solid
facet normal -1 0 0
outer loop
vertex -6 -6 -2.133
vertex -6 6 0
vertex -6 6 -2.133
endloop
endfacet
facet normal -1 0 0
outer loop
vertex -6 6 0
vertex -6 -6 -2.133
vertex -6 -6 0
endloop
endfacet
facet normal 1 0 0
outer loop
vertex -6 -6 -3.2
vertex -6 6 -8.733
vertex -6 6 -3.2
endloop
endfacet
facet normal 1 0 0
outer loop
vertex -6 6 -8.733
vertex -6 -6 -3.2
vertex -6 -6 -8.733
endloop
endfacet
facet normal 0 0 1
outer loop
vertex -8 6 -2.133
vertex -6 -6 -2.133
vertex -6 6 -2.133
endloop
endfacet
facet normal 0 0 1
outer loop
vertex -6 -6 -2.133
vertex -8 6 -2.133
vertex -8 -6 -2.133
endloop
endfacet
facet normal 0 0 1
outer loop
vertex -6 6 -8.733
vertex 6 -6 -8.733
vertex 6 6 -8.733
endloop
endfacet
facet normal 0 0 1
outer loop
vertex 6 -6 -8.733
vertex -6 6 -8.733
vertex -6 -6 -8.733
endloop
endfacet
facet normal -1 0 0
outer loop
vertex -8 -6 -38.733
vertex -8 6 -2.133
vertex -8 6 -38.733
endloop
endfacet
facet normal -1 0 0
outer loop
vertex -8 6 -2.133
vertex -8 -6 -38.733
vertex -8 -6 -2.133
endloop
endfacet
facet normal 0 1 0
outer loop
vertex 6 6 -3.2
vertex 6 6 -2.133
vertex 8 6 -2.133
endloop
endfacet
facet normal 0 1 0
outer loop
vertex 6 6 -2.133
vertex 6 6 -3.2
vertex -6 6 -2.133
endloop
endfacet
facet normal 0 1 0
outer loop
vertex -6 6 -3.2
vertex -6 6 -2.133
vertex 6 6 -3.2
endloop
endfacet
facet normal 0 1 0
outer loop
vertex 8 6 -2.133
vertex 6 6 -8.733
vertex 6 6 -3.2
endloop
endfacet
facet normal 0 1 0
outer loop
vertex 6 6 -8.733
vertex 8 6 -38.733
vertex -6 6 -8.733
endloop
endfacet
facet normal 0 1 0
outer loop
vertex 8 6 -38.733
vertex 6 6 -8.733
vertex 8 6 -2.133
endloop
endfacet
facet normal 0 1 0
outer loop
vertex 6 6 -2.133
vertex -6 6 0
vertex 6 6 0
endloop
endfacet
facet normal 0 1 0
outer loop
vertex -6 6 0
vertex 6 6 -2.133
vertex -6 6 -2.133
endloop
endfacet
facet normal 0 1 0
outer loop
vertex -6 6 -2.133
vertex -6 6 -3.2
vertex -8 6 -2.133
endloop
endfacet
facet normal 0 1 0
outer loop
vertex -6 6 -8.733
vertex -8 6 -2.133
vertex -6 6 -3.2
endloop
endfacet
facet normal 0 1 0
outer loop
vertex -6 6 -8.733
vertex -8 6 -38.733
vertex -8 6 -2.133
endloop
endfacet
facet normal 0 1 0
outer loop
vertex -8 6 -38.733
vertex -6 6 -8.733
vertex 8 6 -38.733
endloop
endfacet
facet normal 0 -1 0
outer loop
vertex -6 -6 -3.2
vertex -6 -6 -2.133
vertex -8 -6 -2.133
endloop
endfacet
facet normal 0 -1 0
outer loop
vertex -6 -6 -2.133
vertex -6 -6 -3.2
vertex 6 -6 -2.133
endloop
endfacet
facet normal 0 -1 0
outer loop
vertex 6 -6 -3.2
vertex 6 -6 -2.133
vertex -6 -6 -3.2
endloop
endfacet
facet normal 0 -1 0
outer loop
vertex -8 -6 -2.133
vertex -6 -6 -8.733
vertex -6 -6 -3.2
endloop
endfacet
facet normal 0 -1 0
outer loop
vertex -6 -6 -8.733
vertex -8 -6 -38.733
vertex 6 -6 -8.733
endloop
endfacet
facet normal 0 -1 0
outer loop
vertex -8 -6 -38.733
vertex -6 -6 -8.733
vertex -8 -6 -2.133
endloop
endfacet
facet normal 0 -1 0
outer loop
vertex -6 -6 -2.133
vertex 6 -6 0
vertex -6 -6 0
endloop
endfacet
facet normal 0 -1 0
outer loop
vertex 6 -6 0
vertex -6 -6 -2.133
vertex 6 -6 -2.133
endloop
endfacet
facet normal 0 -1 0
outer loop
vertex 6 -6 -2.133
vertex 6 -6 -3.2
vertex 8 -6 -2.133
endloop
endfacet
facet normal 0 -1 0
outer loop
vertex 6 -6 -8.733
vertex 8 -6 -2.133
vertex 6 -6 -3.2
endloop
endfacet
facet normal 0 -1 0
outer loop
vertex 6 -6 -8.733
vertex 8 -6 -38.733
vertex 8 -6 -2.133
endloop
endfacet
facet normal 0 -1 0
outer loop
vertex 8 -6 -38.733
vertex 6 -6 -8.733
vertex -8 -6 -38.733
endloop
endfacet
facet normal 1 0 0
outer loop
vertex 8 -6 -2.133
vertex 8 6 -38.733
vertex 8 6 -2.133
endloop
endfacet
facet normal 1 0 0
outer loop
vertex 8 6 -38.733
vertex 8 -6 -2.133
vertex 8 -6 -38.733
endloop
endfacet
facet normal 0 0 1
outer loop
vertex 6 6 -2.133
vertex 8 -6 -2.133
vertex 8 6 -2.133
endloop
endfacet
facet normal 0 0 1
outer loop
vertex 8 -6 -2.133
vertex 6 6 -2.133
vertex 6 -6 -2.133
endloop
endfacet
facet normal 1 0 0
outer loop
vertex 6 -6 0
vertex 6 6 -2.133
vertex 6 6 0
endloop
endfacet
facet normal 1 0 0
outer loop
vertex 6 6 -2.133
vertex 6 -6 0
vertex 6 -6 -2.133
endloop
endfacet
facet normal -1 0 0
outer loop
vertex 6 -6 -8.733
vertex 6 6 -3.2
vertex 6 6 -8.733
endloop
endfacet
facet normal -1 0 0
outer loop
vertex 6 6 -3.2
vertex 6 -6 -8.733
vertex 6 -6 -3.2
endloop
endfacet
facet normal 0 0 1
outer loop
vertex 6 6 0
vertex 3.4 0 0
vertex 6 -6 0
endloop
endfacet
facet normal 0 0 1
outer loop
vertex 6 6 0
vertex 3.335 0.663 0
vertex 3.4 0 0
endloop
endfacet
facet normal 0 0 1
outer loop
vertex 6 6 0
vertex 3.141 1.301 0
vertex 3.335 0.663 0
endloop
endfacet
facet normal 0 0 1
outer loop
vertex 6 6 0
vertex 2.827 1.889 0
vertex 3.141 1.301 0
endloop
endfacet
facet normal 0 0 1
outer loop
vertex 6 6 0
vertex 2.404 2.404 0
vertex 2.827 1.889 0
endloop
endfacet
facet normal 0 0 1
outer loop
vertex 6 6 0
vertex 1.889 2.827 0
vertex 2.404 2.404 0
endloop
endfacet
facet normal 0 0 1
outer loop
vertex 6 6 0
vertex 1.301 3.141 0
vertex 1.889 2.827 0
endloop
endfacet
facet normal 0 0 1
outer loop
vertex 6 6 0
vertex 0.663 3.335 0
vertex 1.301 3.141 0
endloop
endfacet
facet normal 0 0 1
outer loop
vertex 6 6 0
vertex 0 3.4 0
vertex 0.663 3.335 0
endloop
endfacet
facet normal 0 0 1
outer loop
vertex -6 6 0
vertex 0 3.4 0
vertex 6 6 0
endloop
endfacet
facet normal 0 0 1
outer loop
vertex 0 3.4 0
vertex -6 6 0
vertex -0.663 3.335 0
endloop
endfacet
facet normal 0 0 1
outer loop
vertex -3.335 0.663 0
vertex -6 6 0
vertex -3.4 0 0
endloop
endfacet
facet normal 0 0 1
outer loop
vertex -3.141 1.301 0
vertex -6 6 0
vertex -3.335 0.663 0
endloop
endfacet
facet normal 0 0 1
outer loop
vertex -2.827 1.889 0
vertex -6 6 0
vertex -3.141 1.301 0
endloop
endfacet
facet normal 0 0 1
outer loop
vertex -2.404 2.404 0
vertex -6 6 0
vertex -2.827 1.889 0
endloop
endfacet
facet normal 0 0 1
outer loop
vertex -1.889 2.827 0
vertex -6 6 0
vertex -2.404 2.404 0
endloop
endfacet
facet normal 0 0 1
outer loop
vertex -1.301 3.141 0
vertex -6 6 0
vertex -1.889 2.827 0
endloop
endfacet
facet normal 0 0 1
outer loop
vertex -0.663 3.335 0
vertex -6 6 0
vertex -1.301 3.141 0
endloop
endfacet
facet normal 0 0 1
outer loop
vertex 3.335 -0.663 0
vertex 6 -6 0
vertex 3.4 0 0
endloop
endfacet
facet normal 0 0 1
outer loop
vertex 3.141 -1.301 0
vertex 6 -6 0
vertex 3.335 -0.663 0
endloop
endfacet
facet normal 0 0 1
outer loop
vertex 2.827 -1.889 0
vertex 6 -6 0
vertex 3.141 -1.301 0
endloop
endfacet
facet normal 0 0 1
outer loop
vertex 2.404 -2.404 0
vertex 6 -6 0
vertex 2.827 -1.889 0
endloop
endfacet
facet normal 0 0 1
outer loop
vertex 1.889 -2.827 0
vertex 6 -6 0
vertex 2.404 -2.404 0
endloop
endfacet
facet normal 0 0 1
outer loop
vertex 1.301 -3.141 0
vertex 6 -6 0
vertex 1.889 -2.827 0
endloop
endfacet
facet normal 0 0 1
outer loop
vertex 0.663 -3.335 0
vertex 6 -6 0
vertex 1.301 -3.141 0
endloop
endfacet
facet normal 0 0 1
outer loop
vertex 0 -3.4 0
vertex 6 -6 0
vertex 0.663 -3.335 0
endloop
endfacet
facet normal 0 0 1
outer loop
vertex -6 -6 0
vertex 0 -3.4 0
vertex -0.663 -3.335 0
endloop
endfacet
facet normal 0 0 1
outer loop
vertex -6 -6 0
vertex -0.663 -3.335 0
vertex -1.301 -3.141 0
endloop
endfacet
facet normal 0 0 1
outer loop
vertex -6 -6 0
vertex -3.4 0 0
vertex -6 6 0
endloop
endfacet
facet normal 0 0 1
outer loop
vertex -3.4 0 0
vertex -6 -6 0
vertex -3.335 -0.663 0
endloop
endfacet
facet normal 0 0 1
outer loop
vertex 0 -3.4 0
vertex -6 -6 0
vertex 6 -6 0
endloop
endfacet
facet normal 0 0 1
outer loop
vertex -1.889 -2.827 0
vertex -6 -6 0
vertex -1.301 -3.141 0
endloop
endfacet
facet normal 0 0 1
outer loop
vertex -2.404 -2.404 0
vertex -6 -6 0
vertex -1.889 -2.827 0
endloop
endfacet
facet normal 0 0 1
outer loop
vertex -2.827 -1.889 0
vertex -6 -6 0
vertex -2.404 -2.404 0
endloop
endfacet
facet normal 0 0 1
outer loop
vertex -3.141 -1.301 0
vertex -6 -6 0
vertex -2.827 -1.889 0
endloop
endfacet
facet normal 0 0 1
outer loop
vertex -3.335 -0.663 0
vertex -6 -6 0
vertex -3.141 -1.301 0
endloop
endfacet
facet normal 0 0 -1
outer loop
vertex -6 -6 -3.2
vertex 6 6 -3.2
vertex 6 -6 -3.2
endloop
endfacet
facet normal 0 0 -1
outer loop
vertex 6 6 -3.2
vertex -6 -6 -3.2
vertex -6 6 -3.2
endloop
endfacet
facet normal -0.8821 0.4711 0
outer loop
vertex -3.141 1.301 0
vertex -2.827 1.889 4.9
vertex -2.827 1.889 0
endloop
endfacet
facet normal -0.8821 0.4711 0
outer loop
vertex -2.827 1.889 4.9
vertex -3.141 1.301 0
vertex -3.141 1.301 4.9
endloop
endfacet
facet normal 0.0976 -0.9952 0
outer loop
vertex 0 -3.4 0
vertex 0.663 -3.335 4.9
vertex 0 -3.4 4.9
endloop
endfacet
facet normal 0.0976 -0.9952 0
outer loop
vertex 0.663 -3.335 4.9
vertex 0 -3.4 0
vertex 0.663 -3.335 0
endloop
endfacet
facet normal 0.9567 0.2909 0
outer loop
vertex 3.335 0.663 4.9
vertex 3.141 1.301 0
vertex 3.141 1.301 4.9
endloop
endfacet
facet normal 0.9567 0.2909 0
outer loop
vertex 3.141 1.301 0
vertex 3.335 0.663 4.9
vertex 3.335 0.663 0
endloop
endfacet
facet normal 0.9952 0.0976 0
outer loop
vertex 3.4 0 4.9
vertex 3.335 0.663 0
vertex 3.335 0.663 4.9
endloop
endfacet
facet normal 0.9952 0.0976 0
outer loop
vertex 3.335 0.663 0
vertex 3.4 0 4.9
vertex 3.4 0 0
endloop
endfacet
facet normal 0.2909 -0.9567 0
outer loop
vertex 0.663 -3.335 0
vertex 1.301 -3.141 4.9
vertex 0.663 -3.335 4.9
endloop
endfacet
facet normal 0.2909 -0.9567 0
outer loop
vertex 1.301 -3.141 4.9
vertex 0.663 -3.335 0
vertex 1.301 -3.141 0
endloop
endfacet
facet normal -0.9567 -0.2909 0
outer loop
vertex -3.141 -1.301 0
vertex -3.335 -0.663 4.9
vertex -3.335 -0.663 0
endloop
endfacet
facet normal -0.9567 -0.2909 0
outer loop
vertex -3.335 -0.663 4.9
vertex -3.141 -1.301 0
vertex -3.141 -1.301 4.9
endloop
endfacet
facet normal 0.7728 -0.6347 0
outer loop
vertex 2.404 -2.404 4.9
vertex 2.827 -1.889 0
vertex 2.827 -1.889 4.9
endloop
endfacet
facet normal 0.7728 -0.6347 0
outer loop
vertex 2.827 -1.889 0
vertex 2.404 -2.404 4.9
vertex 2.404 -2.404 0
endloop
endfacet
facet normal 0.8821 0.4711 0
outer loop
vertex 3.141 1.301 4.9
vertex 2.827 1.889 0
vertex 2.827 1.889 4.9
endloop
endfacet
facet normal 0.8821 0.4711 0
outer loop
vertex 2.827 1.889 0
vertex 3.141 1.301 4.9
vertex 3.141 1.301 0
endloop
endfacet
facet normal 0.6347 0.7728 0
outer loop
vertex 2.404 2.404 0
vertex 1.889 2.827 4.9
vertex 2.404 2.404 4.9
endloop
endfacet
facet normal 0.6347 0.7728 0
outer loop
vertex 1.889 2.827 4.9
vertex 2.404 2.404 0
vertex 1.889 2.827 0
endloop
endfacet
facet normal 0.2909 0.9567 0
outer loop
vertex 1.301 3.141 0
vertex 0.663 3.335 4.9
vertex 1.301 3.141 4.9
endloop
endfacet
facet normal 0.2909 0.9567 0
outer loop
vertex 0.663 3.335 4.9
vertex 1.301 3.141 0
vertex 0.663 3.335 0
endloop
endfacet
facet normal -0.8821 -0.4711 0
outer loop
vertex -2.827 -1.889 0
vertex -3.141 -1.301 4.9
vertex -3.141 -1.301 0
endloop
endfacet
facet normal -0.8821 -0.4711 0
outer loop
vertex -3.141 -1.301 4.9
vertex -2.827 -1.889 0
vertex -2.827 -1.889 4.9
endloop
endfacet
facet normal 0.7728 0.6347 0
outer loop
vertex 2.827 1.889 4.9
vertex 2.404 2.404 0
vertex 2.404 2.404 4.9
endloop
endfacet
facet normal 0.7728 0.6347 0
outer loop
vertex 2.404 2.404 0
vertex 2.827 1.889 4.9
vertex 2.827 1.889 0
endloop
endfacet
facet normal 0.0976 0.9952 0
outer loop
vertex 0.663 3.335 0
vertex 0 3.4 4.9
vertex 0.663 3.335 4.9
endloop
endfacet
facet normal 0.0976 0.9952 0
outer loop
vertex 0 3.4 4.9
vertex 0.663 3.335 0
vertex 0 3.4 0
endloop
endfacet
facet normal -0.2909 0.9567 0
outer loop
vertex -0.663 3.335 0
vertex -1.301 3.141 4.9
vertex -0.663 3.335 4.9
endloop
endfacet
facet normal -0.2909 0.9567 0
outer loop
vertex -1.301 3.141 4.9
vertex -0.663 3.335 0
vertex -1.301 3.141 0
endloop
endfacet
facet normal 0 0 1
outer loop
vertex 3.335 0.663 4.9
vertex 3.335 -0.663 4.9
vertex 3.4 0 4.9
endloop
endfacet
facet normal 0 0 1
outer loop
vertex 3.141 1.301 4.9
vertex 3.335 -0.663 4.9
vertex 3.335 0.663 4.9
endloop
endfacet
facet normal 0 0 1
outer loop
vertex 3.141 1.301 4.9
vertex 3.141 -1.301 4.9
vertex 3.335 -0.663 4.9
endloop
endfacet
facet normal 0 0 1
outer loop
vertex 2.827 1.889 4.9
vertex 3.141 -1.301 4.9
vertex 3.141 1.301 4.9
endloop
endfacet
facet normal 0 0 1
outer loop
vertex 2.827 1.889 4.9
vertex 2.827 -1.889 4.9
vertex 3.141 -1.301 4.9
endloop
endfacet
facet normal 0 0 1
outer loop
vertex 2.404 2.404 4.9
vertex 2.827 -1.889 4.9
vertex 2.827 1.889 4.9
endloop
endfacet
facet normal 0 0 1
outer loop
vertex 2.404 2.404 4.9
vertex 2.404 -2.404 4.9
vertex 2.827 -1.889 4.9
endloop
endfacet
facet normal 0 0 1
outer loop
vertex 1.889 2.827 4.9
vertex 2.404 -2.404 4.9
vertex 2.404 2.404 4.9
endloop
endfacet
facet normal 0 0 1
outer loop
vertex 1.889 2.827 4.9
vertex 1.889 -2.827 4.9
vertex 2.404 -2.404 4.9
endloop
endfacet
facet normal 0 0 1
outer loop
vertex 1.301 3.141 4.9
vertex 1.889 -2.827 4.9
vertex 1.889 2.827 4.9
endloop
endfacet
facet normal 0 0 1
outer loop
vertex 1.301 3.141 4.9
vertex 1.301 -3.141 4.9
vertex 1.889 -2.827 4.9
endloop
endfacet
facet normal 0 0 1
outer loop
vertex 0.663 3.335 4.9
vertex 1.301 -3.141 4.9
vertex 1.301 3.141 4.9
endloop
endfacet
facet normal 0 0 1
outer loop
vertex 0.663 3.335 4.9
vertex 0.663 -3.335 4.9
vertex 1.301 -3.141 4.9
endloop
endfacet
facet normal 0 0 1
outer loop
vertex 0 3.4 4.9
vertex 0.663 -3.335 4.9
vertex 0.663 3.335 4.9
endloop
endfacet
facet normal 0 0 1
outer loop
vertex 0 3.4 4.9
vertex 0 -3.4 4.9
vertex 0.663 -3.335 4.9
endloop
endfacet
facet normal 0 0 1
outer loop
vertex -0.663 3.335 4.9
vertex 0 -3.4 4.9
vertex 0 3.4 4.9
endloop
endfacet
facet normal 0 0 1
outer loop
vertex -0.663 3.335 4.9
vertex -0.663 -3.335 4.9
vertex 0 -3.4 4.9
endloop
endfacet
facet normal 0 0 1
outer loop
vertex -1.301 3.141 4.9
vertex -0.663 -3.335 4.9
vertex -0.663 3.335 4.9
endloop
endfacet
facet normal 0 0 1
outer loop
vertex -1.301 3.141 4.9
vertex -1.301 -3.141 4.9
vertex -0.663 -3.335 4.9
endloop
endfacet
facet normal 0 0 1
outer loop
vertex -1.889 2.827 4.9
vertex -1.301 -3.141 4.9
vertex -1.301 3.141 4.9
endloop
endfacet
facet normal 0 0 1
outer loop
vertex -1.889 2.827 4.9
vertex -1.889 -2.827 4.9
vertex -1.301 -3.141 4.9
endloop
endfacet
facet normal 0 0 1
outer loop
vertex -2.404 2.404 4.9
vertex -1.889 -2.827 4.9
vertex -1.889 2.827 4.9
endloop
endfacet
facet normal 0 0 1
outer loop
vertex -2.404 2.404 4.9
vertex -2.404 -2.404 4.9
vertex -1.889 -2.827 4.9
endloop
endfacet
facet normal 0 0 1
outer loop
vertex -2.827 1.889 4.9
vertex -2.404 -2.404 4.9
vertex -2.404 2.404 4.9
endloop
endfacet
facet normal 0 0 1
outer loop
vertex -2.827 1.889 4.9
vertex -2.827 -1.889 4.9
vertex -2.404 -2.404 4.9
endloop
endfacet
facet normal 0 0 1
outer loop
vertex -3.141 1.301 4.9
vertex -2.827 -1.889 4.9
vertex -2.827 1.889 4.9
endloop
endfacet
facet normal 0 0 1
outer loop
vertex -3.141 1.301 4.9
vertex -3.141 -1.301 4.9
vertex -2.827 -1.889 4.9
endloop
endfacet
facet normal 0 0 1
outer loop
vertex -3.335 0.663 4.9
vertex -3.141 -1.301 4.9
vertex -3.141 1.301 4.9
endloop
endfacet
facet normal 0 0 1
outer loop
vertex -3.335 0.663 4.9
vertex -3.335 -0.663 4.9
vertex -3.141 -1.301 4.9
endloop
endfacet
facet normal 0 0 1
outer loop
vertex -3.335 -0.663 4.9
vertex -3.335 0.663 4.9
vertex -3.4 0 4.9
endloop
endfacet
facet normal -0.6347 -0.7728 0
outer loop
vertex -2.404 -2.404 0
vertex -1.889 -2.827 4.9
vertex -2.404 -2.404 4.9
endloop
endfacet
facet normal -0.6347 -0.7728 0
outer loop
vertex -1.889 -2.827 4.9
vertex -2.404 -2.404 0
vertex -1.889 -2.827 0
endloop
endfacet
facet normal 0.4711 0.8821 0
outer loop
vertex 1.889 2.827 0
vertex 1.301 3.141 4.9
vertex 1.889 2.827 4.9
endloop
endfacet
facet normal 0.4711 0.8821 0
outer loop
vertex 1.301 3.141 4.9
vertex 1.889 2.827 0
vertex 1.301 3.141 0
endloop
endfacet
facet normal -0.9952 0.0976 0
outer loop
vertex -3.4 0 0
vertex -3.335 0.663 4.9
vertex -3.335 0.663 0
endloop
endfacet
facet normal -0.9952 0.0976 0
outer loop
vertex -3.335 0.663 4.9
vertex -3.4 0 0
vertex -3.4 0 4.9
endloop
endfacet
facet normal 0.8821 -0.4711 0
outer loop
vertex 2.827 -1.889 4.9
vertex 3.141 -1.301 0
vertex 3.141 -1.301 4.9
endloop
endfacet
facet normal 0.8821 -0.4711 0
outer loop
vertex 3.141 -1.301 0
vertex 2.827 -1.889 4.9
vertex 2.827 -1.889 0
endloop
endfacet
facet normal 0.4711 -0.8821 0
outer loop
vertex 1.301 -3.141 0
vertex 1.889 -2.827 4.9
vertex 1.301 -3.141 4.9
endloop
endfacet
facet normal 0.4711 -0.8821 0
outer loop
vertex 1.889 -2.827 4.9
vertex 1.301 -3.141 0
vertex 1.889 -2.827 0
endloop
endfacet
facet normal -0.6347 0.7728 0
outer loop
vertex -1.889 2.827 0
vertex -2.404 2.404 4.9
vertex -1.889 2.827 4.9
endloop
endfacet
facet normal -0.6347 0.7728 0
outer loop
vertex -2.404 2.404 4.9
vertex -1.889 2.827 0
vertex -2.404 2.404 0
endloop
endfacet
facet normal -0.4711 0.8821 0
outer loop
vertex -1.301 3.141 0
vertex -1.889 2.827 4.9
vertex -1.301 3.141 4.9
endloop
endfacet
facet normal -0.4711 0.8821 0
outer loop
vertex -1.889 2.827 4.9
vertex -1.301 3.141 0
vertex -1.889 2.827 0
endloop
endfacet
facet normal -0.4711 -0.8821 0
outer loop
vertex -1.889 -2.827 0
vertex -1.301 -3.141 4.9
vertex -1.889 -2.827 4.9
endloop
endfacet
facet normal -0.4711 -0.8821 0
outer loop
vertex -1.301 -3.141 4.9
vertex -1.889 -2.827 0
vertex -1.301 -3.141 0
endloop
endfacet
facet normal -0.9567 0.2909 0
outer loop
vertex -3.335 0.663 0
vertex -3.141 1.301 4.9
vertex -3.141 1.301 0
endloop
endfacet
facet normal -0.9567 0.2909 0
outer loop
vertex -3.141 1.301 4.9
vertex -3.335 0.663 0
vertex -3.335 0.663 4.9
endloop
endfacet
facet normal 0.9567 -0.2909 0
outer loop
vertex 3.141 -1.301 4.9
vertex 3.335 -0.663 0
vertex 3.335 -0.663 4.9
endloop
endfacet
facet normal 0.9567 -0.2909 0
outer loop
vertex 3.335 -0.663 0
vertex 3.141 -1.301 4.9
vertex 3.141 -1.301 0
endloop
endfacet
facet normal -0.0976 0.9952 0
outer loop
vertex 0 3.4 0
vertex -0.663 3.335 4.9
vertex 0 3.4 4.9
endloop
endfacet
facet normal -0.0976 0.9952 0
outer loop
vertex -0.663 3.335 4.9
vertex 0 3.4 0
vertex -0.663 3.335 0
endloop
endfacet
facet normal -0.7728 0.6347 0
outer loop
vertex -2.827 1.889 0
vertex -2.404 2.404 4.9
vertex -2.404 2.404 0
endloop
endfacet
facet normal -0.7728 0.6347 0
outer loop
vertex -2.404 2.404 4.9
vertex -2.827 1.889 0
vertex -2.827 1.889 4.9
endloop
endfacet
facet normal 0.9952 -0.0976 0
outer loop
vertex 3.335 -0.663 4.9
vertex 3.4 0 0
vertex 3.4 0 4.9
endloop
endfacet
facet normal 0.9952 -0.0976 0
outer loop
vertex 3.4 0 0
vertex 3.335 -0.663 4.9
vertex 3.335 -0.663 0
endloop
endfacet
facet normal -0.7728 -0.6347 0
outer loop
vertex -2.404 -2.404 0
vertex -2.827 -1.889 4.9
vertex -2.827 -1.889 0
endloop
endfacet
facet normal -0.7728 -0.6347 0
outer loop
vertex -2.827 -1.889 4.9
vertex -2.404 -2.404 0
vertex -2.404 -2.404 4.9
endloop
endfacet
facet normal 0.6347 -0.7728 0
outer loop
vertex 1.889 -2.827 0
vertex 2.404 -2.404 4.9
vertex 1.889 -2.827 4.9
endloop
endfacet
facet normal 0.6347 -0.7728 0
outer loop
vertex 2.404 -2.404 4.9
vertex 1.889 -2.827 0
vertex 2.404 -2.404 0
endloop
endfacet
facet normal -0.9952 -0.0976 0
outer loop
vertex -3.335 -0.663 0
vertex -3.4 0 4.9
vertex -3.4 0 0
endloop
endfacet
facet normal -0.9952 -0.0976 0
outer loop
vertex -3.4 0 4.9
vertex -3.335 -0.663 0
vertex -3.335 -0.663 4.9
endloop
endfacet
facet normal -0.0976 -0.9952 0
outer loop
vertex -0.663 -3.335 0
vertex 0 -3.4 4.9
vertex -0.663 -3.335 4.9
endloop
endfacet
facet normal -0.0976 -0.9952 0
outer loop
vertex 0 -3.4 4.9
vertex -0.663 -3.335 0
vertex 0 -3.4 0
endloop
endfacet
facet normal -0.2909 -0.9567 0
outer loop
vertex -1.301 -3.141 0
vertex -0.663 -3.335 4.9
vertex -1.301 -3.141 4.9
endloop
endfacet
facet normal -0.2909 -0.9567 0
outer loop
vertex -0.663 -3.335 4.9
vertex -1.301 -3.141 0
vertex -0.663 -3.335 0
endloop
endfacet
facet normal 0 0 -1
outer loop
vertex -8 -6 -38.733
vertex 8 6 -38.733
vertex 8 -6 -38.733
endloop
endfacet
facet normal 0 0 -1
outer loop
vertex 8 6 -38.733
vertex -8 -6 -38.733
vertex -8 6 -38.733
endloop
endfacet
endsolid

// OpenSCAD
// m3 bolt negative space
// Part of http://vor.space by Futurice
// ©Futurice Oy, paul.houghton@futurice.com, CC-attribution-sharealike license, http://creativecommons.org/licenses/by-sa/4.0/

$fn=32;

base_side = 12;
base_height = 3.2;

button_radius = 6.8/2;
button_height = 4.9;

prong_width=2;
prong_length=base_height/2 + 5;

push_button();

module push_button() {
    color("blue") base();
    color("black") button();
    color("silver") prongs();
    color("green") translate([0,0,-prong_length]) hull() {
        prongs(length=30);
    }
}

module base() {
    translate([-base_side/2,-base_side/2,-base_height]) cube([base_side,base_side,base_height]);
}

module button() {
    cylinder(r=button_radius, h=button_height);
}

module prongs(length=prong_length) {
    prong(x=-base_side/2 - prong_width,l=length);
    prong(x=base_side/2,l=length);
}

module prong(x=0,l=prong_length) {
    translate([x,-base_side/2,-2*base_height/3 - l]) cube([prong_width,base_side,l]);
}
